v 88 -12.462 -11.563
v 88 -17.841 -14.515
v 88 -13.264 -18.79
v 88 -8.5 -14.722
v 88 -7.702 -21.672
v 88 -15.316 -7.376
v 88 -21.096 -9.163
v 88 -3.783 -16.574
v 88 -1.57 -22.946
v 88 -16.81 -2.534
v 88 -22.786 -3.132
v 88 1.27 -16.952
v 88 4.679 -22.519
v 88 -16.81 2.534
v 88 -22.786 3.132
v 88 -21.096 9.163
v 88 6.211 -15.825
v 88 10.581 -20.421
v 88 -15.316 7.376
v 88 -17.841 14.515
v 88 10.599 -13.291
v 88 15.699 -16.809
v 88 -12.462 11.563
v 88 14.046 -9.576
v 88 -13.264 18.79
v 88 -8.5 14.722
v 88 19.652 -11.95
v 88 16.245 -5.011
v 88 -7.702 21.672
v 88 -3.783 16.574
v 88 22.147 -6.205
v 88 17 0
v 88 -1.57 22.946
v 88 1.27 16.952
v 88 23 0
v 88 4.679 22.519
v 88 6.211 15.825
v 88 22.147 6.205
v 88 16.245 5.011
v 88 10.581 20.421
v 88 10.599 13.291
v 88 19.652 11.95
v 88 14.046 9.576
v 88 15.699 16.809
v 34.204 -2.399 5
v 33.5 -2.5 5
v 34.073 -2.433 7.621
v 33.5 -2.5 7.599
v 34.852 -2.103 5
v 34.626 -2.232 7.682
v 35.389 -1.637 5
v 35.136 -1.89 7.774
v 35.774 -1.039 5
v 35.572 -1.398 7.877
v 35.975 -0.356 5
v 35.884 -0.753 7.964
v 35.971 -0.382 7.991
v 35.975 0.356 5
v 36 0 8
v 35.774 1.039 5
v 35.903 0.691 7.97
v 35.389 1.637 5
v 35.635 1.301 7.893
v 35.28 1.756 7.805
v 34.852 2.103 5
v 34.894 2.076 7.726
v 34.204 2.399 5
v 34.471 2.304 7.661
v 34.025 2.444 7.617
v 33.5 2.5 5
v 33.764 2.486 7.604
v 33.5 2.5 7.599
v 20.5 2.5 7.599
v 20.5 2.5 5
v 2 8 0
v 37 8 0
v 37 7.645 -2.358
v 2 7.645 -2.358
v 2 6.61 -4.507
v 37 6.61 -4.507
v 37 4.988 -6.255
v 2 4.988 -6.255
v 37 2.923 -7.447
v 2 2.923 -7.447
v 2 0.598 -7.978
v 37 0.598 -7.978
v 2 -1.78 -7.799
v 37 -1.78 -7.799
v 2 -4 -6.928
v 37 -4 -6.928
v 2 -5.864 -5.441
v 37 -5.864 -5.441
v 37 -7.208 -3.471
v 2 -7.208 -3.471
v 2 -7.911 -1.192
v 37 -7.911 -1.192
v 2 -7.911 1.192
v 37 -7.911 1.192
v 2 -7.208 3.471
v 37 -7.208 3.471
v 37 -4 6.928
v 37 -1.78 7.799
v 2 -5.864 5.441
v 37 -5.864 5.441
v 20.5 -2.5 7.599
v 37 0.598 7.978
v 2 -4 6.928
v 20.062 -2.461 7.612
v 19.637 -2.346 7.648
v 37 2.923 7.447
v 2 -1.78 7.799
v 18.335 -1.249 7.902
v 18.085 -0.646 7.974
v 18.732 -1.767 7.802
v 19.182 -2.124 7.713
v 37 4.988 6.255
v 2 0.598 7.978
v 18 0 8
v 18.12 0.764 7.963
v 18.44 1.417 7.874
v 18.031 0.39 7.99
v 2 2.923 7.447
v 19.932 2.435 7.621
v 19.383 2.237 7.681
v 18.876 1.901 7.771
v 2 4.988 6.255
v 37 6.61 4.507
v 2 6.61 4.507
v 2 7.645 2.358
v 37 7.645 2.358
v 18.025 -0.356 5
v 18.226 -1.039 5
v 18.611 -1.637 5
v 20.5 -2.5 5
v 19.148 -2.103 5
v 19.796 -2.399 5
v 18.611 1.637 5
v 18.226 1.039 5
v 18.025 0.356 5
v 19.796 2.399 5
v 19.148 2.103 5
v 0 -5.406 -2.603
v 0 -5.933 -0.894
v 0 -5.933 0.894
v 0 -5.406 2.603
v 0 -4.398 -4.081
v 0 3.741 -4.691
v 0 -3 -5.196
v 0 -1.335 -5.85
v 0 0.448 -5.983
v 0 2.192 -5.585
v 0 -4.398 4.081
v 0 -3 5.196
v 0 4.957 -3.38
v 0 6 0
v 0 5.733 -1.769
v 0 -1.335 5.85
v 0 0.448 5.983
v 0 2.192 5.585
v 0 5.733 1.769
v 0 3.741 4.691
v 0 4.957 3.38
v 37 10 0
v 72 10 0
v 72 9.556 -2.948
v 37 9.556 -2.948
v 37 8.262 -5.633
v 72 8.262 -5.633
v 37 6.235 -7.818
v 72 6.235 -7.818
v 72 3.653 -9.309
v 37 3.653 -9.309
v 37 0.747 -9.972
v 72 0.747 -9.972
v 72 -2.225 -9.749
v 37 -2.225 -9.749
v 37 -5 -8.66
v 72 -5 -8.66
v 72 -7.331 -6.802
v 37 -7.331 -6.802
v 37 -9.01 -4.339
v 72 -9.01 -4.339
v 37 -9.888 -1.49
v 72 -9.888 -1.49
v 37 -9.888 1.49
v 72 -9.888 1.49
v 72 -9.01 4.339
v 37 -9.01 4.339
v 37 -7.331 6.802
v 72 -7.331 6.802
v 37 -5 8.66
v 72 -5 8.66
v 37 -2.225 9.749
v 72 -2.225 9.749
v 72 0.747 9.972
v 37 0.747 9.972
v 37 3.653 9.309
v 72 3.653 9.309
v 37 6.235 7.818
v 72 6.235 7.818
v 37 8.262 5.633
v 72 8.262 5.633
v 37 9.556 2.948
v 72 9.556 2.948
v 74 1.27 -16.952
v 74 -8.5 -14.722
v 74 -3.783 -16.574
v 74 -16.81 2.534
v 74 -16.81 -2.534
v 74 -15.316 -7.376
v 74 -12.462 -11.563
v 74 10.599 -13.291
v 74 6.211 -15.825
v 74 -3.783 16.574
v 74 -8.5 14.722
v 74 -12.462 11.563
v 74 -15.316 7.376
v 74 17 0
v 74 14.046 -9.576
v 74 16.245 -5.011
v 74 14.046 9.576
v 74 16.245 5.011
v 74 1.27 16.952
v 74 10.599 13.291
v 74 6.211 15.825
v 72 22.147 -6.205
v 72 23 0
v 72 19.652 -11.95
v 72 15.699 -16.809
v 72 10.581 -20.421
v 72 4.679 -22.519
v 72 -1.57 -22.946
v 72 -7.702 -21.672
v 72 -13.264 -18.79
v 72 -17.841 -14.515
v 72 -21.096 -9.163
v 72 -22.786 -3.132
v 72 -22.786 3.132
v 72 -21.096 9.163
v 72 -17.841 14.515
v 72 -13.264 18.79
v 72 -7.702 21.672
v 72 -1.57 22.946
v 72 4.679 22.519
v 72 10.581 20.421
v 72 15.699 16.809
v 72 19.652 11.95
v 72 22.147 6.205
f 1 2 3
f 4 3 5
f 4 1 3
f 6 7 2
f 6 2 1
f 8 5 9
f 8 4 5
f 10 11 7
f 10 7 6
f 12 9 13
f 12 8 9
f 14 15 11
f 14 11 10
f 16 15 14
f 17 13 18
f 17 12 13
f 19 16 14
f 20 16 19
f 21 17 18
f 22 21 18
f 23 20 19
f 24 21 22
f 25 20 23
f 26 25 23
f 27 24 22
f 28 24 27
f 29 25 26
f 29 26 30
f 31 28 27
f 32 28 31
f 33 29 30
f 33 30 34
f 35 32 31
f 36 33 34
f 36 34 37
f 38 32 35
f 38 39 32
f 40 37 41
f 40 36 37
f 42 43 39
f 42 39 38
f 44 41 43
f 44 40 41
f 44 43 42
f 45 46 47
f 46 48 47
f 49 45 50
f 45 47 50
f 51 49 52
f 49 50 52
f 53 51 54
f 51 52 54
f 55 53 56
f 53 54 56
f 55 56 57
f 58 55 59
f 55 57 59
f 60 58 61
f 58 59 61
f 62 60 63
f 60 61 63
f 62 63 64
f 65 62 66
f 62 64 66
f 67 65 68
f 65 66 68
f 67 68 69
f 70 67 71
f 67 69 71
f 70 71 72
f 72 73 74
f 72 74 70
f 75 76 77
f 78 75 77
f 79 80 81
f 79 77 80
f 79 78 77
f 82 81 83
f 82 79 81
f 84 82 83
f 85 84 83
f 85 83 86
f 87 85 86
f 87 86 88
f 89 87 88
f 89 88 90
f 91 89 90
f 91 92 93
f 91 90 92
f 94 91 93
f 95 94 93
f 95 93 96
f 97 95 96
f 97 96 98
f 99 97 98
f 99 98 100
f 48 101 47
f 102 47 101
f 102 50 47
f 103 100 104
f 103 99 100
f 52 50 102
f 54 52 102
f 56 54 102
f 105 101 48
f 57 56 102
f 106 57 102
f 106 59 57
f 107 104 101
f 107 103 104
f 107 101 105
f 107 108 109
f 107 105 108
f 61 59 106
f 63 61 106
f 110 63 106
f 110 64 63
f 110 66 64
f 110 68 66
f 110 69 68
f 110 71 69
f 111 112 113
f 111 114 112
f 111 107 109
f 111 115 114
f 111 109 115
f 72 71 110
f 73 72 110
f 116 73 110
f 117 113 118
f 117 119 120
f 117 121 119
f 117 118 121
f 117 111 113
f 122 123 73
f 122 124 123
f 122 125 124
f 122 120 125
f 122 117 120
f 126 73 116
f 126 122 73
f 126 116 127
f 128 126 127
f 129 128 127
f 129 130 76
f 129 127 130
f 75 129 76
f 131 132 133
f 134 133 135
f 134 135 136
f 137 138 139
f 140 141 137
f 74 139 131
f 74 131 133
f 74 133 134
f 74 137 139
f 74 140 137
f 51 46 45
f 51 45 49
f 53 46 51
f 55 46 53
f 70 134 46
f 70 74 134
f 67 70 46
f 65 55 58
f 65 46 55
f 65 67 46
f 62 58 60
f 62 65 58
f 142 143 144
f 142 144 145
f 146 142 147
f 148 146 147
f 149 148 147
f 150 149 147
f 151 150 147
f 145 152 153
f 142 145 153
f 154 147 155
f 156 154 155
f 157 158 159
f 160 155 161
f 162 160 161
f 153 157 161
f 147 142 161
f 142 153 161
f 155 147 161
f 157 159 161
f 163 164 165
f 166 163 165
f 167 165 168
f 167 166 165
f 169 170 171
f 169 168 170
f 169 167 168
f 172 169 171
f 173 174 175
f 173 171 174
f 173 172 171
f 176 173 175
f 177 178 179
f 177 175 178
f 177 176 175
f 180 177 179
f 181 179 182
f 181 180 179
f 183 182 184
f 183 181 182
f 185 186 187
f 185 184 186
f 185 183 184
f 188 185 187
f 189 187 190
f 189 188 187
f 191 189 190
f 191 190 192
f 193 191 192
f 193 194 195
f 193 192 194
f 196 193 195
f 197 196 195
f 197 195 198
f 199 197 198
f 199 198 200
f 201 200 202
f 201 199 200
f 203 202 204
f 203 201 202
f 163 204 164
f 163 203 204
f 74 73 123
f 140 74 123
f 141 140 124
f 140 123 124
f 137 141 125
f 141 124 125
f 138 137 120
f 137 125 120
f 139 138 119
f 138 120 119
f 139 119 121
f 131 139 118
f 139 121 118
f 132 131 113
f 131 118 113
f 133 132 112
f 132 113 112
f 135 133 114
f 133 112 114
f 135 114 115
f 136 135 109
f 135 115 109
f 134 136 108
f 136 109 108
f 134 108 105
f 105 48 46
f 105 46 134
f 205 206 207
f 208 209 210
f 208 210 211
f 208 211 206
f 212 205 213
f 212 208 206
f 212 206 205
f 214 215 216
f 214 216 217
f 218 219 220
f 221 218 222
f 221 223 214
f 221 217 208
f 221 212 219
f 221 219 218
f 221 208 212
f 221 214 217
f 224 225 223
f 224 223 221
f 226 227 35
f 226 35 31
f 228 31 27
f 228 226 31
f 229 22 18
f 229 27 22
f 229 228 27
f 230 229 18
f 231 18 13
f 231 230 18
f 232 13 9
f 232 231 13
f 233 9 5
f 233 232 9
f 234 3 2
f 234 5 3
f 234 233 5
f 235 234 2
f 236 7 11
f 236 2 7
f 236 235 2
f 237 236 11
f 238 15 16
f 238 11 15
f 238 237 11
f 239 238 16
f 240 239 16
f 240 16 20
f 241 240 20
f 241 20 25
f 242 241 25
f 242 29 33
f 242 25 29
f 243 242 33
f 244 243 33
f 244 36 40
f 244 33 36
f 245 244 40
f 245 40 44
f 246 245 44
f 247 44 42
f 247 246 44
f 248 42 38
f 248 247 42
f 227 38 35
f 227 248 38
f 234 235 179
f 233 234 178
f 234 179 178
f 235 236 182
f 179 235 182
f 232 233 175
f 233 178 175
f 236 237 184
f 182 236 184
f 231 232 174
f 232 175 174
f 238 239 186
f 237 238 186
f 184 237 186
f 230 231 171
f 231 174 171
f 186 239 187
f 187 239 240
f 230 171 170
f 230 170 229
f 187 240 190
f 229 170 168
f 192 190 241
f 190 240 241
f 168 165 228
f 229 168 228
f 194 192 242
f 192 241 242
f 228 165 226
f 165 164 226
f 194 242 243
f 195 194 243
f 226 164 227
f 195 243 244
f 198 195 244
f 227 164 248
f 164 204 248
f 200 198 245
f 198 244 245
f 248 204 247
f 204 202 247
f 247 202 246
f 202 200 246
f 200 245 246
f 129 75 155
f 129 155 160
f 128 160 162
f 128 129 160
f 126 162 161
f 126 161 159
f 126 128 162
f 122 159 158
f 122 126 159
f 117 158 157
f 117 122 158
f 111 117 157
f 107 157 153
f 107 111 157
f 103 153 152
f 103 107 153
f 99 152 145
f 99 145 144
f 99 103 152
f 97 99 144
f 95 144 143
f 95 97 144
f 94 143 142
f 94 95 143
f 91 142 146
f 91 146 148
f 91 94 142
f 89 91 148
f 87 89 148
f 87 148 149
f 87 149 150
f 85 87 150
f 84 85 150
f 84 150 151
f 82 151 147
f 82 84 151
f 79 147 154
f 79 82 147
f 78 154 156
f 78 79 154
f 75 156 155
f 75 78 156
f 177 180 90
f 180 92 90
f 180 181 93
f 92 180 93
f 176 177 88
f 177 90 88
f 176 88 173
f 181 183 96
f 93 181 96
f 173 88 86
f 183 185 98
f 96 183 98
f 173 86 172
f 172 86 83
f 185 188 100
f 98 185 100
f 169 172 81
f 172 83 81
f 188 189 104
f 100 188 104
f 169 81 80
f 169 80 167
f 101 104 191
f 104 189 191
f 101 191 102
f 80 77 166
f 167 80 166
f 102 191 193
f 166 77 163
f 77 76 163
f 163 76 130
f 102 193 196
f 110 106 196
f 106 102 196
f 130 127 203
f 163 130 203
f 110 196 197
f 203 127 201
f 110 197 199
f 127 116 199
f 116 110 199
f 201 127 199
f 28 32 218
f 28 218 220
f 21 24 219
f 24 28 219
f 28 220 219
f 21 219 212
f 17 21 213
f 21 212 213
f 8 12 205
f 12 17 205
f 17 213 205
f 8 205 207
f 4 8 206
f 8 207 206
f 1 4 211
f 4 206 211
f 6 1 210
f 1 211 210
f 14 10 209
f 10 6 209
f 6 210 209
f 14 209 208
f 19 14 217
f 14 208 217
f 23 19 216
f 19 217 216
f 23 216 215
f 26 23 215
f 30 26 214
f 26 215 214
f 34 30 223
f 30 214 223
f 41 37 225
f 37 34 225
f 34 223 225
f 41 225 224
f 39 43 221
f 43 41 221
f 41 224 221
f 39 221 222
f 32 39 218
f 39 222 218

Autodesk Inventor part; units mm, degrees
ref_plane "YZ Plane" through (0, 0, 0) normal (1, 0, 0) x (0, 1, 0)
ref_plane "XZ Plane" through (0, 0, 0) normal (0, 1, 0) x (-1, 0, 0)
sketch "Sketch1" plane through (0, 0, 0) normal (0, 0, 1) x (1, 0, 0)
  line L0 (0, 0) -> (88, 0)
  line L1 (88, 0) -> (88, 23)
  line L2 (88, 23) -> (72, 23)
  line L3 (72, 23) -> (72, 10)
  line L4 (72, 10) -> (37, 10)
  line L5 (37, 10) -> (37, 8)
  line L6 (37, 8) -> (0, 8)
  line L7 (0, 8) -> (0, 0)
  line L8 (88, 17) -> (74, 17)
  line L9 (74, 17) -> (74, 0)
  dimension "d0" = 88
  dimension "d1" = 16
  dimension "d2" = 35
  dimension "d3" = 2
  dimension "d4" = 46
  dimension "d5" = 6
  dimension "d6" = 20
  dimension "d7" = 16
revolve "Revolution1" add sketch "Sketch1" angle 360 about axis through (0, 0, 0) along (1, 0, 0) contours L7 L6 L5 L4 L3 L2 L1 L8 L9 L0
thread "Thread1" size "M16x2" class "6g" standard "ISO Metric profile" length 16
ref_plane "Work Plane1" through (18.5, 0, 8) normal (0, 0, 1) x (1, 0, 0)
sketch "Sketch2" plane through (18.5, 0, 8) normal (0, 0, 1) x (1, 0, 0)
  line L0 (-36.1, 0) -> (87.1, 0) construction
  line L1 (17.5, 0) -> (-0.5, 0) construction
  line L2 (15, -2.5) -> (2, -2.5)
  line L3 (2, 2.5) -> (15, 2.5)
  arc A0 (15, -2.5) -> (15, 2.5) centre (15, 0) ccw
  arc A1 (2, 2.5) -> (2, -2.5) centre (2, 0) ccw
  line L4 (18.5, -10) -> (18.5, 10) projected
  point P0 (-18.5, 0)
  point P1 (8.5, 0)
  point P2 (17.5, 0)
  point P3 (-0.5, 0)
  dimension "d11" = 5
  dimension "d12" = 18
  dimension "d13" = 1
extrude "Extrusion1" cut sketch "Sketch2" against normal blind 3
chamfer "Chamfer1" distance 2 angle 45 1 edges at (0, -8, 0)
properties material "Steel, Alloy"
